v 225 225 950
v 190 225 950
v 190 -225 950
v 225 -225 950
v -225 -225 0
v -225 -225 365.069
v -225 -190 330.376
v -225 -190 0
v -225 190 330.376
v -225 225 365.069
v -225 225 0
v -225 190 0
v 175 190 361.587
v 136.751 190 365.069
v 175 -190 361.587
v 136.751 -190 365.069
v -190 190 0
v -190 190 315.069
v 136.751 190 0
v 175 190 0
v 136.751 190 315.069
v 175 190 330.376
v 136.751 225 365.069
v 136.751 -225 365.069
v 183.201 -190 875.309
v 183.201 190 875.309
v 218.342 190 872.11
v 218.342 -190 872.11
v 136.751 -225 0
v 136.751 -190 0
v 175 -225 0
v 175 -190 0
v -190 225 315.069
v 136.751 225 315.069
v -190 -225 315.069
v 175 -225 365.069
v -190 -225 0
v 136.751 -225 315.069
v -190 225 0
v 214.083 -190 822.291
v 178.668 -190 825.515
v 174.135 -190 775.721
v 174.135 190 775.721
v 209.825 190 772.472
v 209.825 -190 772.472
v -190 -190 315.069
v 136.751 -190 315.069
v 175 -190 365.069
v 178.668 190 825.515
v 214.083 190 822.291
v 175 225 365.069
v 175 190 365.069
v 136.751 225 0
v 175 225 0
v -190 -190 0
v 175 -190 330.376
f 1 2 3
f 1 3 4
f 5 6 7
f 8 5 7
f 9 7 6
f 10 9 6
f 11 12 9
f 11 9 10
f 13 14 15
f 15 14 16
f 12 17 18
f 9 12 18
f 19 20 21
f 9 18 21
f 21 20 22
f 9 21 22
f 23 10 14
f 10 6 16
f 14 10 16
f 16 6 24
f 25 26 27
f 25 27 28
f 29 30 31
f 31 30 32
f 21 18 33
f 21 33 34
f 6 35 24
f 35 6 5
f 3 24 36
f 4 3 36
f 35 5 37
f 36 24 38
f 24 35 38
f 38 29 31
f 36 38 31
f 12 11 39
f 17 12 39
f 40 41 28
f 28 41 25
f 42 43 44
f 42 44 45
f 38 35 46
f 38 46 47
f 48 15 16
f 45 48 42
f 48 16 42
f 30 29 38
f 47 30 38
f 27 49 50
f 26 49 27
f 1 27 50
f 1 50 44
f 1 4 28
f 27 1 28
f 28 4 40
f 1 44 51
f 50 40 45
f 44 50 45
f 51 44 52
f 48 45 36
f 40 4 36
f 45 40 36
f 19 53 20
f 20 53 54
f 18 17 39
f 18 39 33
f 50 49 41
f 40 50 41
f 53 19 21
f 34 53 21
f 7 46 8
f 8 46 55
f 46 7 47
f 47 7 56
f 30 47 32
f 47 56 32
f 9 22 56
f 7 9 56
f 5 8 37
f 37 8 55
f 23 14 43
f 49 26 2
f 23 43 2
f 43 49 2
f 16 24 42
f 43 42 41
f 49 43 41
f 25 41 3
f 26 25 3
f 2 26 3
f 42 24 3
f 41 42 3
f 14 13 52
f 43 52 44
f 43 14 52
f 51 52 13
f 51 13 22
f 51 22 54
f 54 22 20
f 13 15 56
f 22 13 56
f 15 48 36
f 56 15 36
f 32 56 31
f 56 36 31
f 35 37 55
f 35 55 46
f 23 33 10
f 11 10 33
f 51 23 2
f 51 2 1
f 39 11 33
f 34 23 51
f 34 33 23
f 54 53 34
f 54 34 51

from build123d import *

# Parameters (mm, degrees)
F0_W     = 450
F0_H     = 450
F1_DEPTH = 950
F2_W     = 50
F2_H     = 315.0687813759
F2_W_2   = 326.7514157295
F3_DEPTH = 450.001
F5_DEPTH = 400.001
F6_W     = 380
F6_H     = 412.3499316829
F6_H_2   = 50
F7_DEPTH = 120.98296301


with BuildPart() as f1:
    # F0 (on Top) → F1 (new body)
    with BuildSketch(Plane.XY):
        Rectangle(F0_W, F0_H)
    extrude(amount=F1_DEPTH)

    # F2 (on face) → F3 (cut, through all)
    with BuildSketch(Plane.XZ.offset(225)):
        Polygon((-225, 950), (-225, 365.0687813759), (136.7514157295, 365.0687813759), (190, 950), align=None)
        Polygon((200, 657.5343906879), (175, 365.0687813759), (225, 365.0687813759), (225, 950), align=None)
        Polygon((225, 365.0687813759), (175, 365.0687813759), (175, 315.0687813759), (225, 315.0687813759), (225, 360.064893961), (225, 365.064893961), align=None)
        with Locations((200, 157.5343906879)):
            Rectangle(F2_W, F2_H)
        with Locations((-26.6242921352, 157.5343906879)):
            Rectangle(F2_W_2, F2_H)
    extrude(amount=-F3_DEPTH, mode=Mode.SUBTRACT)

    # F4 (on face) → F5 (cut, through all)
    with BuildSketch(Plane.YZ.offset(175)):
        Polygon((-190, 172.1675388782), (-190, 0), (190, 0), (190, 330.3755388782), (-190, 330.3755388782), align=None)
    extrude(amount=-F5_DEPTH, mode=Mode.SUBTRACT)

    # F6 (on face) → F7 (cut, through all)
    with BuildSketch(Plane(origin=(102.6669528821, 0, -9.3461756156), x_dir=(0, -1, 0), z_dir=(-0.9958819897, 0, 0.0906590457))):
        with Locations((0, 582.1381430631)):
            Rectangle(F6_W, F6_H)
        with Locations((0, 863.3131089045)):
            Rectangle(F6_W, F6_H_2)
    extrude(amount=-F7_DEPTH, mode=Mode.SUBTRACT)


solid = f1.part
